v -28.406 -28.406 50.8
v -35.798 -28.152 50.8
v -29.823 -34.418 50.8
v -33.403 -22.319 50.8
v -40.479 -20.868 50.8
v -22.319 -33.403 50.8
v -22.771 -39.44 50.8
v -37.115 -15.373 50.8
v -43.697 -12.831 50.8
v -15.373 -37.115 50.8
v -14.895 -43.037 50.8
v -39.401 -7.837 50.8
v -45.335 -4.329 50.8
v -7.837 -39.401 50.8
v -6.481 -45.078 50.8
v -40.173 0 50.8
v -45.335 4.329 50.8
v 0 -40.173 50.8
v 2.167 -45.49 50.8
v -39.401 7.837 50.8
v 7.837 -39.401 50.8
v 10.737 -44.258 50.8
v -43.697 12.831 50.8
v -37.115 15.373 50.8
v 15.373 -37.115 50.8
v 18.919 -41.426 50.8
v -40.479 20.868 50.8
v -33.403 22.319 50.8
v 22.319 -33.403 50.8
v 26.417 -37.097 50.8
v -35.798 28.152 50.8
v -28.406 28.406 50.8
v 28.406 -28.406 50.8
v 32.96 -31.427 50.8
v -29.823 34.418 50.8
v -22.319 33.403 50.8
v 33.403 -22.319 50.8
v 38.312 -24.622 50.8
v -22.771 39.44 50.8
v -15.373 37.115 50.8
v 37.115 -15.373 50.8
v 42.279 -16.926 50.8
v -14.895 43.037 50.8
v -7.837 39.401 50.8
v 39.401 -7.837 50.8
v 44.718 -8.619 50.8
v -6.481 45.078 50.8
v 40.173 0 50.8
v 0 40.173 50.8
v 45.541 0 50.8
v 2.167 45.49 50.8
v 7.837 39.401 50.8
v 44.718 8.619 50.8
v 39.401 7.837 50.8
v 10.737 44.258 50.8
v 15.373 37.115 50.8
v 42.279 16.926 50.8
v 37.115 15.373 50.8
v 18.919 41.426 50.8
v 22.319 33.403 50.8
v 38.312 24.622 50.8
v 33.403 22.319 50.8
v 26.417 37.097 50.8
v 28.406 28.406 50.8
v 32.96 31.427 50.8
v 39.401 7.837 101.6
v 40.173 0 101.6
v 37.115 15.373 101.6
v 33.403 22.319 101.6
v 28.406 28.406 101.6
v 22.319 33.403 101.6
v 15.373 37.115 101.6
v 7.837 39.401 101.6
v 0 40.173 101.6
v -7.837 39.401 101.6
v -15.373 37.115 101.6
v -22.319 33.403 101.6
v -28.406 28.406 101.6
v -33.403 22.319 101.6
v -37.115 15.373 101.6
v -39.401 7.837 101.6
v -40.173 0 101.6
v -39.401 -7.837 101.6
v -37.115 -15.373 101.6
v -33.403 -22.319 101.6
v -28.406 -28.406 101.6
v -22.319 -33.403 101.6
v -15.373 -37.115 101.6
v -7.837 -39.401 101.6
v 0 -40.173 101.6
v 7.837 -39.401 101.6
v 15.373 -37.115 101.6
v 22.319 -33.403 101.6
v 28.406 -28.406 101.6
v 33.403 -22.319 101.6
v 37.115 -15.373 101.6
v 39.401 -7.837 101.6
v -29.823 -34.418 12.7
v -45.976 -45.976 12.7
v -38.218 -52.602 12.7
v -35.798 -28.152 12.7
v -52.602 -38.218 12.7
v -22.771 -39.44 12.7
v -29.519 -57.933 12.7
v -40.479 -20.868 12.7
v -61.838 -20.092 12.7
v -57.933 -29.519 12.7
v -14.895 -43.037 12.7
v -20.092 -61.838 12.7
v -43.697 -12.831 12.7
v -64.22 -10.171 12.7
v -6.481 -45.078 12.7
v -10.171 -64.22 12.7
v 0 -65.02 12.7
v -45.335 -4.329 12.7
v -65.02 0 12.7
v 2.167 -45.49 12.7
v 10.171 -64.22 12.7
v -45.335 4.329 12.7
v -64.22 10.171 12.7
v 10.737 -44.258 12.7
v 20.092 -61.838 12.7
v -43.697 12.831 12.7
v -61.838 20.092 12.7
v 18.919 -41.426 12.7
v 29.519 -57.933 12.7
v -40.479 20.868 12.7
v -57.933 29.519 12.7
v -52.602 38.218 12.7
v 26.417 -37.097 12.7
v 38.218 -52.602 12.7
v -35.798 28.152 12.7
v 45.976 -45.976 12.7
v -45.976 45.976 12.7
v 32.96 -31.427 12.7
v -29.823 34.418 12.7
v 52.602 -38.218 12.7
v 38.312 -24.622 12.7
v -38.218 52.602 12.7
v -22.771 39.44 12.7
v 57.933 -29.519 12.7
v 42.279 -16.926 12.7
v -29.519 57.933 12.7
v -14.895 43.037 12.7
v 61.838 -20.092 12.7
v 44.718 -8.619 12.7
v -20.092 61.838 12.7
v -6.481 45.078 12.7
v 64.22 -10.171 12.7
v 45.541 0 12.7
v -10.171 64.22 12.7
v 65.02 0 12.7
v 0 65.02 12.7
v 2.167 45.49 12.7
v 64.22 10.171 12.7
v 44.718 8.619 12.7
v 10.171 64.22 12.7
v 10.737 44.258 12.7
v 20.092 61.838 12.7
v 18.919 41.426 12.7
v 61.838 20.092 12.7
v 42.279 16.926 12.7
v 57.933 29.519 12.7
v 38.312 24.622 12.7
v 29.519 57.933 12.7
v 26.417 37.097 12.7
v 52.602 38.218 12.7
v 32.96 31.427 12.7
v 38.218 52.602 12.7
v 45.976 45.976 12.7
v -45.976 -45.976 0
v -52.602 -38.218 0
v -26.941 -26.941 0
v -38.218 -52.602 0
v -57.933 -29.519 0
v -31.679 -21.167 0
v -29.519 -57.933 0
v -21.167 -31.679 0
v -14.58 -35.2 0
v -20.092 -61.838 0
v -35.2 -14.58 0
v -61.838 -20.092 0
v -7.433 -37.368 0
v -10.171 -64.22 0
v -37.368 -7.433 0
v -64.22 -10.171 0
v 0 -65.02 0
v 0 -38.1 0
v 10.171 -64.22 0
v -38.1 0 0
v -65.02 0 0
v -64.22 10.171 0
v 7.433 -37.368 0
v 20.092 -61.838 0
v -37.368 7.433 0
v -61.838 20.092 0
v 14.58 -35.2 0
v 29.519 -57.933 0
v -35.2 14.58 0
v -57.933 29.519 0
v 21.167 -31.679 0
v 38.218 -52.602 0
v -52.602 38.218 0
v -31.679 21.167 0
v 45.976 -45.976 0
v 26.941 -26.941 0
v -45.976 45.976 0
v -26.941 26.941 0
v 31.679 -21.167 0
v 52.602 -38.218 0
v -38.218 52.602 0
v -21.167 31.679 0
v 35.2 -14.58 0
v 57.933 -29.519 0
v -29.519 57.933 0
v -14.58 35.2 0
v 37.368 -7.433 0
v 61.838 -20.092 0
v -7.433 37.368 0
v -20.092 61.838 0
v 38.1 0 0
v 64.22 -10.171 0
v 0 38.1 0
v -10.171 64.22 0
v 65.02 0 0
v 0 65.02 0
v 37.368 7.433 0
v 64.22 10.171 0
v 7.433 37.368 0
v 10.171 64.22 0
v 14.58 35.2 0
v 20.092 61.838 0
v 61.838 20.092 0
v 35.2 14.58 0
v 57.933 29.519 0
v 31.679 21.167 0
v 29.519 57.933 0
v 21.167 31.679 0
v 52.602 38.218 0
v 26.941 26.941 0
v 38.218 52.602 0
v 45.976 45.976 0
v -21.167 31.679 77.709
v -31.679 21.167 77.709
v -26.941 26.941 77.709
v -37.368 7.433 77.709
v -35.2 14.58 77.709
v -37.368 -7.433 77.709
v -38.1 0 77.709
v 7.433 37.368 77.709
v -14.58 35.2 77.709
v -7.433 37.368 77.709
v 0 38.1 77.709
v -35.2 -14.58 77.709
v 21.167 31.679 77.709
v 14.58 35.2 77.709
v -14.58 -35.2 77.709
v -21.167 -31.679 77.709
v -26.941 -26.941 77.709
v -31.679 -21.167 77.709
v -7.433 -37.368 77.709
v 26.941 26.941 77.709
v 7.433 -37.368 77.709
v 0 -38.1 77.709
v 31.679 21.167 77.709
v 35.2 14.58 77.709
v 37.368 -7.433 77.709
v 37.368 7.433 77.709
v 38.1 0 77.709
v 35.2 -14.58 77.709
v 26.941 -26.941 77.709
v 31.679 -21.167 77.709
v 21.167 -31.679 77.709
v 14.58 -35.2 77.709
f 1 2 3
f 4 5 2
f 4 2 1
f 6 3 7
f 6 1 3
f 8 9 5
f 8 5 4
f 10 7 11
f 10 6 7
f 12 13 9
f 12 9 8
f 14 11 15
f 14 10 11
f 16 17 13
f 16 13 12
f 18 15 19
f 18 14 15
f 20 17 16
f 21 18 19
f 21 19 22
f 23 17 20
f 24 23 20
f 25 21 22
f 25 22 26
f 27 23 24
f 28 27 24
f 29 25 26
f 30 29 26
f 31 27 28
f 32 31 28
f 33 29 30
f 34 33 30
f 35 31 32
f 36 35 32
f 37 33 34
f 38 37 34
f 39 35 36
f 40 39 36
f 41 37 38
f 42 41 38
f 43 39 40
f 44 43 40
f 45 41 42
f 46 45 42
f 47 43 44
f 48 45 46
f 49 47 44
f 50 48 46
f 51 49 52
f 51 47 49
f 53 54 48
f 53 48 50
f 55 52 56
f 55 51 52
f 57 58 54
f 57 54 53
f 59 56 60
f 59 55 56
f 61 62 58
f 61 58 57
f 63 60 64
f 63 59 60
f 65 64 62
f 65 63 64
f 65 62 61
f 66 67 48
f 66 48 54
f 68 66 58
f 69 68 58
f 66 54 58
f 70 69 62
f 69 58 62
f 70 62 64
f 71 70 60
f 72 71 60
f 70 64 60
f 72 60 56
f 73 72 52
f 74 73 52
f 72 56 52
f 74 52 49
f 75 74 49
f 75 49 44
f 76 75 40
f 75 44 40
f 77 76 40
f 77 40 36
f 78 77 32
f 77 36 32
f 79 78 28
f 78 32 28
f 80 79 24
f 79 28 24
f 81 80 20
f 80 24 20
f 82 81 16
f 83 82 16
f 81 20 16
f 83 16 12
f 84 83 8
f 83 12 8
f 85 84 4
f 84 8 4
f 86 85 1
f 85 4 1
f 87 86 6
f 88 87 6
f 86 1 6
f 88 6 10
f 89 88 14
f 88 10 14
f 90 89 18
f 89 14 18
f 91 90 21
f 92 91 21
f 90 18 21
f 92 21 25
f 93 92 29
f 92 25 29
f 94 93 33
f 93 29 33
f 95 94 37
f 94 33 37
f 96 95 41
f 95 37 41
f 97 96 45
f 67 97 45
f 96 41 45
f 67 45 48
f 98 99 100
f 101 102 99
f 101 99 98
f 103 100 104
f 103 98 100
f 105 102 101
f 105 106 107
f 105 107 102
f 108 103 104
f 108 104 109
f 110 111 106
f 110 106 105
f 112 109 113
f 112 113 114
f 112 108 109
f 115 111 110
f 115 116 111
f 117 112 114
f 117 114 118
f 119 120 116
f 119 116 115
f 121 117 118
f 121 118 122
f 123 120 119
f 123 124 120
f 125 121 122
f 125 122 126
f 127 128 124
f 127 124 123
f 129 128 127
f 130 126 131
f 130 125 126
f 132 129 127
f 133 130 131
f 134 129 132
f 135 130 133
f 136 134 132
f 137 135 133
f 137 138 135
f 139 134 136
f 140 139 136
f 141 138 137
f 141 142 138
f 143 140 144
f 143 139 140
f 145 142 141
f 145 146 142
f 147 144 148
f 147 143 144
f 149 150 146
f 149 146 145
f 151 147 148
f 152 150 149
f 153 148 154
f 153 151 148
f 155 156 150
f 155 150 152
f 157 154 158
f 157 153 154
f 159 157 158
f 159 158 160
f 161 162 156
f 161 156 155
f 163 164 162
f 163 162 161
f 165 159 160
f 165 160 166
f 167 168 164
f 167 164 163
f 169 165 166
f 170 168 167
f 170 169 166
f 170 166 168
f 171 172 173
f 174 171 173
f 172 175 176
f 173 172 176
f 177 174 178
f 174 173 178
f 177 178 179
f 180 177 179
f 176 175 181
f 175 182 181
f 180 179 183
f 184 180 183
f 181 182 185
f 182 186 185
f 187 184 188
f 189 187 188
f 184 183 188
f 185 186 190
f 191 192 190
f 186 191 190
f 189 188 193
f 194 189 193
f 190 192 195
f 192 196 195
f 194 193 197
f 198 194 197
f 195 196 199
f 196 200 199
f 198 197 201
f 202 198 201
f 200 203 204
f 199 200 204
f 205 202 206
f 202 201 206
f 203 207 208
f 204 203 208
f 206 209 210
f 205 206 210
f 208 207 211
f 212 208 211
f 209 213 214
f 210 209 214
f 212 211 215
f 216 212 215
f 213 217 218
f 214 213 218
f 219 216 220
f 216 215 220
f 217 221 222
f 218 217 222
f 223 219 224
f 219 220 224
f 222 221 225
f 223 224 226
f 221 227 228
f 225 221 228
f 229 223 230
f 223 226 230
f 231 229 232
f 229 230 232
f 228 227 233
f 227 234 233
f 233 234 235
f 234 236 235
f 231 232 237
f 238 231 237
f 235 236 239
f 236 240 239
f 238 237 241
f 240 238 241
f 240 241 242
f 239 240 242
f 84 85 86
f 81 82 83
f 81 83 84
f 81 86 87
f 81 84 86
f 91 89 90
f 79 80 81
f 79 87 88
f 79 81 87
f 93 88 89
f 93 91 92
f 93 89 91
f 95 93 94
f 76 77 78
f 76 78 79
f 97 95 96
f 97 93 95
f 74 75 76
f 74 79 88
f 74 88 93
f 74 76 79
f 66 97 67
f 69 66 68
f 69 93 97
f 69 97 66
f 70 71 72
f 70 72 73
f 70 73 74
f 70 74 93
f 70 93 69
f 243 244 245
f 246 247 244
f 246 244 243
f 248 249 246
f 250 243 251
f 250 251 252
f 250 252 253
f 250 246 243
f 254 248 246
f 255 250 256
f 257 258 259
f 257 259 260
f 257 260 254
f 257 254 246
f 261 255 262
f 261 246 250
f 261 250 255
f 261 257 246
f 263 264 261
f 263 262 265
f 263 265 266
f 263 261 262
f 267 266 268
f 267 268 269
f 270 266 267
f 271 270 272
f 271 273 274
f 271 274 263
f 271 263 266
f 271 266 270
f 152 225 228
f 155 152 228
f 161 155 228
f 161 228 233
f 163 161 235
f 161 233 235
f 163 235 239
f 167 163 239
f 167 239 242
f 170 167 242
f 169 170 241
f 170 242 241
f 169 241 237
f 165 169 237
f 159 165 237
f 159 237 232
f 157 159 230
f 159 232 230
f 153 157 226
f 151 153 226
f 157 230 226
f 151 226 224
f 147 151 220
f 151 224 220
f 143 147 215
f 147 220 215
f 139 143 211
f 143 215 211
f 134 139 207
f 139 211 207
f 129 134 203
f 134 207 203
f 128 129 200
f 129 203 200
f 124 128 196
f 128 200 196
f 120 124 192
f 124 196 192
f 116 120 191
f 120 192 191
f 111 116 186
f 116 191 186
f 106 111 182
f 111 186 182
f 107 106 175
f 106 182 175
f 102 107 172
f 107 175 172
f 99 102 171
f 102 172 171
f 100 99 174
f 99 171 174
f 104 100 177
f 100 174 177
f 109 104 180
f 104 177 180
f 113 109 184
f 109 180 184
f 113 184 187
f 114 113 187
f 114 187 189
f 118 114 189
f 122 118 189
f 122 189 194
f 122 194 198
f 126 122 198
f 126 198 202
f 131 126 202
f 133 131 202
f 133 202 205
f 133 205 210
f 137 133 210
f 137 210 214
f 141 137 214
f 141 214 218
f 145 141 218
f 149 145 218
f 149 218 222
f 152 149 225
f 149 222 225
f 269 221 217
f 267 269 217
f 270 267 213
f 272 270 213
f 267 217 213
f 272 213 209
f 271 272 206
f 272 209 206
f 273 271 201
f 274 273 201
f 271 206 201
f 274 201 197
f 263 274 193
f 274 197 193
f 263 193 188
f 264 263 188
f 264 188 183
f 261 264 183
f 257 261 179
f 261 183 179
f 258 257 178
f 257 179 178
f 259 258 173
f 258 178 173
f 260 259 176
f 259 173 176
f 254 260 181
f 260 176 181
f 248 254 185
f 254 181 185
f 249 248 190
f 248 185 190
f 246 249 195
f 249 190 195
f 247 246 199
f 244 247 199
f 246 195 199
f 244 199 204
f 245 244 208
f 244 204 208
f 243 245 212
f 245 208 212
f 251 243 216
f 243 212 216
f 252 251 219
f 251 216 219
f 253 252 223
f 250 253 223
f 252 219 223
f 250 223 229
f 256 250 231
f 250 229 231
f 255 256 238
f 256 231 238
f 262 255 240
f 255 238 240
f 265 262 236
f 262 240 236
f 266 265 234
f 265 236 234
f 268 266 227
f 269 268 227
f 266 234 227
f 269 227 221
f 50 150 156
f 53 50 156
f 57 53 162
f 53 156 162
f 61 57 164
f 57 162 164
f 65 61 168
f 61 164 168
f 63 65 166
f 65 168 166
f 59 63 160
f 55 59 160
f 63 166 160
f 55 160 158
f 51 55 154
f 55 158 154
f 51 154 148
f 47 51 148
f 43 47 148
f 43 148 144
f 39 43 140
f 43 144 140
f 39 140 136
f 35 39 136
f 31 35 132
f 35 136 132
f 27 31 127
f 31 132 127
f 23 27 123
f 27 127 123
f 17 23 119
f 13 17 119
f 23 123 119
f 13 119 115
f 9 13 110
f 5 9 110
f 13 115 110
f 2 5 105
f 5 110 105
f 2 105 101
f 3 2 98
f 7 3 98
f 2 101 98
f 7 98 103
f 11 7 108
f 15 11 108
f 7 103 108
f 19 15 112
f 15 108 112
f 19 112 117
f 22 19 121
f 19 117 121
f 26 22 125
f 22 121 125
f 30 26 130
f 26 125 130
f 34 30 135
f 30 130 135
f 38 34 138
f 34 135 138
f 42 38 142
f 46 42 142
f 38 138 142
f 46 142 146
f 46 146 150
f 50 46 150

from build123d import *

# Parameters (mm, degrees)
F0_R     = 65.020167
F1_DEPTH = 12.7
F2_R     = 45.541471
F3_DEPTH = 38.1
F4_R     = 40.172853
F5_DEPTH = 50.8
F6_R     = 38.1
F7_DEPTH = 77.709325


with BuildPart() as f1:
    # F0 (on Top) → F1 (new body)
    with BuildSketch(Plane.XY):
        Circle(F0_R)
    extrude(amount=F1_DEPTH)

    # F2 (on face) → F3 (join)
    with BuildSketch(Plane.XY.offset(12.7)):
        Circle(F2_R)
    extrude(amount=F3_DEPTH)

    # F4 (on face) → F5 (join)
    with BuildSketch(Plane.XY.offset(50.8)):
        Circle(F4_R)
    extrude(amount=F5_DEPTH)

    # F6 (on face) → F7 (cut)
    with BuildSketch(Plane(origin=(0, 0, 0), x_dir=(1, 0, 0), z_dir=(0, 0, -1))):
        Circle(F6_R)
    extrude(amount=-F7_DEPTH, mode=Mode.SUBTRACT)


solid = f1.part
